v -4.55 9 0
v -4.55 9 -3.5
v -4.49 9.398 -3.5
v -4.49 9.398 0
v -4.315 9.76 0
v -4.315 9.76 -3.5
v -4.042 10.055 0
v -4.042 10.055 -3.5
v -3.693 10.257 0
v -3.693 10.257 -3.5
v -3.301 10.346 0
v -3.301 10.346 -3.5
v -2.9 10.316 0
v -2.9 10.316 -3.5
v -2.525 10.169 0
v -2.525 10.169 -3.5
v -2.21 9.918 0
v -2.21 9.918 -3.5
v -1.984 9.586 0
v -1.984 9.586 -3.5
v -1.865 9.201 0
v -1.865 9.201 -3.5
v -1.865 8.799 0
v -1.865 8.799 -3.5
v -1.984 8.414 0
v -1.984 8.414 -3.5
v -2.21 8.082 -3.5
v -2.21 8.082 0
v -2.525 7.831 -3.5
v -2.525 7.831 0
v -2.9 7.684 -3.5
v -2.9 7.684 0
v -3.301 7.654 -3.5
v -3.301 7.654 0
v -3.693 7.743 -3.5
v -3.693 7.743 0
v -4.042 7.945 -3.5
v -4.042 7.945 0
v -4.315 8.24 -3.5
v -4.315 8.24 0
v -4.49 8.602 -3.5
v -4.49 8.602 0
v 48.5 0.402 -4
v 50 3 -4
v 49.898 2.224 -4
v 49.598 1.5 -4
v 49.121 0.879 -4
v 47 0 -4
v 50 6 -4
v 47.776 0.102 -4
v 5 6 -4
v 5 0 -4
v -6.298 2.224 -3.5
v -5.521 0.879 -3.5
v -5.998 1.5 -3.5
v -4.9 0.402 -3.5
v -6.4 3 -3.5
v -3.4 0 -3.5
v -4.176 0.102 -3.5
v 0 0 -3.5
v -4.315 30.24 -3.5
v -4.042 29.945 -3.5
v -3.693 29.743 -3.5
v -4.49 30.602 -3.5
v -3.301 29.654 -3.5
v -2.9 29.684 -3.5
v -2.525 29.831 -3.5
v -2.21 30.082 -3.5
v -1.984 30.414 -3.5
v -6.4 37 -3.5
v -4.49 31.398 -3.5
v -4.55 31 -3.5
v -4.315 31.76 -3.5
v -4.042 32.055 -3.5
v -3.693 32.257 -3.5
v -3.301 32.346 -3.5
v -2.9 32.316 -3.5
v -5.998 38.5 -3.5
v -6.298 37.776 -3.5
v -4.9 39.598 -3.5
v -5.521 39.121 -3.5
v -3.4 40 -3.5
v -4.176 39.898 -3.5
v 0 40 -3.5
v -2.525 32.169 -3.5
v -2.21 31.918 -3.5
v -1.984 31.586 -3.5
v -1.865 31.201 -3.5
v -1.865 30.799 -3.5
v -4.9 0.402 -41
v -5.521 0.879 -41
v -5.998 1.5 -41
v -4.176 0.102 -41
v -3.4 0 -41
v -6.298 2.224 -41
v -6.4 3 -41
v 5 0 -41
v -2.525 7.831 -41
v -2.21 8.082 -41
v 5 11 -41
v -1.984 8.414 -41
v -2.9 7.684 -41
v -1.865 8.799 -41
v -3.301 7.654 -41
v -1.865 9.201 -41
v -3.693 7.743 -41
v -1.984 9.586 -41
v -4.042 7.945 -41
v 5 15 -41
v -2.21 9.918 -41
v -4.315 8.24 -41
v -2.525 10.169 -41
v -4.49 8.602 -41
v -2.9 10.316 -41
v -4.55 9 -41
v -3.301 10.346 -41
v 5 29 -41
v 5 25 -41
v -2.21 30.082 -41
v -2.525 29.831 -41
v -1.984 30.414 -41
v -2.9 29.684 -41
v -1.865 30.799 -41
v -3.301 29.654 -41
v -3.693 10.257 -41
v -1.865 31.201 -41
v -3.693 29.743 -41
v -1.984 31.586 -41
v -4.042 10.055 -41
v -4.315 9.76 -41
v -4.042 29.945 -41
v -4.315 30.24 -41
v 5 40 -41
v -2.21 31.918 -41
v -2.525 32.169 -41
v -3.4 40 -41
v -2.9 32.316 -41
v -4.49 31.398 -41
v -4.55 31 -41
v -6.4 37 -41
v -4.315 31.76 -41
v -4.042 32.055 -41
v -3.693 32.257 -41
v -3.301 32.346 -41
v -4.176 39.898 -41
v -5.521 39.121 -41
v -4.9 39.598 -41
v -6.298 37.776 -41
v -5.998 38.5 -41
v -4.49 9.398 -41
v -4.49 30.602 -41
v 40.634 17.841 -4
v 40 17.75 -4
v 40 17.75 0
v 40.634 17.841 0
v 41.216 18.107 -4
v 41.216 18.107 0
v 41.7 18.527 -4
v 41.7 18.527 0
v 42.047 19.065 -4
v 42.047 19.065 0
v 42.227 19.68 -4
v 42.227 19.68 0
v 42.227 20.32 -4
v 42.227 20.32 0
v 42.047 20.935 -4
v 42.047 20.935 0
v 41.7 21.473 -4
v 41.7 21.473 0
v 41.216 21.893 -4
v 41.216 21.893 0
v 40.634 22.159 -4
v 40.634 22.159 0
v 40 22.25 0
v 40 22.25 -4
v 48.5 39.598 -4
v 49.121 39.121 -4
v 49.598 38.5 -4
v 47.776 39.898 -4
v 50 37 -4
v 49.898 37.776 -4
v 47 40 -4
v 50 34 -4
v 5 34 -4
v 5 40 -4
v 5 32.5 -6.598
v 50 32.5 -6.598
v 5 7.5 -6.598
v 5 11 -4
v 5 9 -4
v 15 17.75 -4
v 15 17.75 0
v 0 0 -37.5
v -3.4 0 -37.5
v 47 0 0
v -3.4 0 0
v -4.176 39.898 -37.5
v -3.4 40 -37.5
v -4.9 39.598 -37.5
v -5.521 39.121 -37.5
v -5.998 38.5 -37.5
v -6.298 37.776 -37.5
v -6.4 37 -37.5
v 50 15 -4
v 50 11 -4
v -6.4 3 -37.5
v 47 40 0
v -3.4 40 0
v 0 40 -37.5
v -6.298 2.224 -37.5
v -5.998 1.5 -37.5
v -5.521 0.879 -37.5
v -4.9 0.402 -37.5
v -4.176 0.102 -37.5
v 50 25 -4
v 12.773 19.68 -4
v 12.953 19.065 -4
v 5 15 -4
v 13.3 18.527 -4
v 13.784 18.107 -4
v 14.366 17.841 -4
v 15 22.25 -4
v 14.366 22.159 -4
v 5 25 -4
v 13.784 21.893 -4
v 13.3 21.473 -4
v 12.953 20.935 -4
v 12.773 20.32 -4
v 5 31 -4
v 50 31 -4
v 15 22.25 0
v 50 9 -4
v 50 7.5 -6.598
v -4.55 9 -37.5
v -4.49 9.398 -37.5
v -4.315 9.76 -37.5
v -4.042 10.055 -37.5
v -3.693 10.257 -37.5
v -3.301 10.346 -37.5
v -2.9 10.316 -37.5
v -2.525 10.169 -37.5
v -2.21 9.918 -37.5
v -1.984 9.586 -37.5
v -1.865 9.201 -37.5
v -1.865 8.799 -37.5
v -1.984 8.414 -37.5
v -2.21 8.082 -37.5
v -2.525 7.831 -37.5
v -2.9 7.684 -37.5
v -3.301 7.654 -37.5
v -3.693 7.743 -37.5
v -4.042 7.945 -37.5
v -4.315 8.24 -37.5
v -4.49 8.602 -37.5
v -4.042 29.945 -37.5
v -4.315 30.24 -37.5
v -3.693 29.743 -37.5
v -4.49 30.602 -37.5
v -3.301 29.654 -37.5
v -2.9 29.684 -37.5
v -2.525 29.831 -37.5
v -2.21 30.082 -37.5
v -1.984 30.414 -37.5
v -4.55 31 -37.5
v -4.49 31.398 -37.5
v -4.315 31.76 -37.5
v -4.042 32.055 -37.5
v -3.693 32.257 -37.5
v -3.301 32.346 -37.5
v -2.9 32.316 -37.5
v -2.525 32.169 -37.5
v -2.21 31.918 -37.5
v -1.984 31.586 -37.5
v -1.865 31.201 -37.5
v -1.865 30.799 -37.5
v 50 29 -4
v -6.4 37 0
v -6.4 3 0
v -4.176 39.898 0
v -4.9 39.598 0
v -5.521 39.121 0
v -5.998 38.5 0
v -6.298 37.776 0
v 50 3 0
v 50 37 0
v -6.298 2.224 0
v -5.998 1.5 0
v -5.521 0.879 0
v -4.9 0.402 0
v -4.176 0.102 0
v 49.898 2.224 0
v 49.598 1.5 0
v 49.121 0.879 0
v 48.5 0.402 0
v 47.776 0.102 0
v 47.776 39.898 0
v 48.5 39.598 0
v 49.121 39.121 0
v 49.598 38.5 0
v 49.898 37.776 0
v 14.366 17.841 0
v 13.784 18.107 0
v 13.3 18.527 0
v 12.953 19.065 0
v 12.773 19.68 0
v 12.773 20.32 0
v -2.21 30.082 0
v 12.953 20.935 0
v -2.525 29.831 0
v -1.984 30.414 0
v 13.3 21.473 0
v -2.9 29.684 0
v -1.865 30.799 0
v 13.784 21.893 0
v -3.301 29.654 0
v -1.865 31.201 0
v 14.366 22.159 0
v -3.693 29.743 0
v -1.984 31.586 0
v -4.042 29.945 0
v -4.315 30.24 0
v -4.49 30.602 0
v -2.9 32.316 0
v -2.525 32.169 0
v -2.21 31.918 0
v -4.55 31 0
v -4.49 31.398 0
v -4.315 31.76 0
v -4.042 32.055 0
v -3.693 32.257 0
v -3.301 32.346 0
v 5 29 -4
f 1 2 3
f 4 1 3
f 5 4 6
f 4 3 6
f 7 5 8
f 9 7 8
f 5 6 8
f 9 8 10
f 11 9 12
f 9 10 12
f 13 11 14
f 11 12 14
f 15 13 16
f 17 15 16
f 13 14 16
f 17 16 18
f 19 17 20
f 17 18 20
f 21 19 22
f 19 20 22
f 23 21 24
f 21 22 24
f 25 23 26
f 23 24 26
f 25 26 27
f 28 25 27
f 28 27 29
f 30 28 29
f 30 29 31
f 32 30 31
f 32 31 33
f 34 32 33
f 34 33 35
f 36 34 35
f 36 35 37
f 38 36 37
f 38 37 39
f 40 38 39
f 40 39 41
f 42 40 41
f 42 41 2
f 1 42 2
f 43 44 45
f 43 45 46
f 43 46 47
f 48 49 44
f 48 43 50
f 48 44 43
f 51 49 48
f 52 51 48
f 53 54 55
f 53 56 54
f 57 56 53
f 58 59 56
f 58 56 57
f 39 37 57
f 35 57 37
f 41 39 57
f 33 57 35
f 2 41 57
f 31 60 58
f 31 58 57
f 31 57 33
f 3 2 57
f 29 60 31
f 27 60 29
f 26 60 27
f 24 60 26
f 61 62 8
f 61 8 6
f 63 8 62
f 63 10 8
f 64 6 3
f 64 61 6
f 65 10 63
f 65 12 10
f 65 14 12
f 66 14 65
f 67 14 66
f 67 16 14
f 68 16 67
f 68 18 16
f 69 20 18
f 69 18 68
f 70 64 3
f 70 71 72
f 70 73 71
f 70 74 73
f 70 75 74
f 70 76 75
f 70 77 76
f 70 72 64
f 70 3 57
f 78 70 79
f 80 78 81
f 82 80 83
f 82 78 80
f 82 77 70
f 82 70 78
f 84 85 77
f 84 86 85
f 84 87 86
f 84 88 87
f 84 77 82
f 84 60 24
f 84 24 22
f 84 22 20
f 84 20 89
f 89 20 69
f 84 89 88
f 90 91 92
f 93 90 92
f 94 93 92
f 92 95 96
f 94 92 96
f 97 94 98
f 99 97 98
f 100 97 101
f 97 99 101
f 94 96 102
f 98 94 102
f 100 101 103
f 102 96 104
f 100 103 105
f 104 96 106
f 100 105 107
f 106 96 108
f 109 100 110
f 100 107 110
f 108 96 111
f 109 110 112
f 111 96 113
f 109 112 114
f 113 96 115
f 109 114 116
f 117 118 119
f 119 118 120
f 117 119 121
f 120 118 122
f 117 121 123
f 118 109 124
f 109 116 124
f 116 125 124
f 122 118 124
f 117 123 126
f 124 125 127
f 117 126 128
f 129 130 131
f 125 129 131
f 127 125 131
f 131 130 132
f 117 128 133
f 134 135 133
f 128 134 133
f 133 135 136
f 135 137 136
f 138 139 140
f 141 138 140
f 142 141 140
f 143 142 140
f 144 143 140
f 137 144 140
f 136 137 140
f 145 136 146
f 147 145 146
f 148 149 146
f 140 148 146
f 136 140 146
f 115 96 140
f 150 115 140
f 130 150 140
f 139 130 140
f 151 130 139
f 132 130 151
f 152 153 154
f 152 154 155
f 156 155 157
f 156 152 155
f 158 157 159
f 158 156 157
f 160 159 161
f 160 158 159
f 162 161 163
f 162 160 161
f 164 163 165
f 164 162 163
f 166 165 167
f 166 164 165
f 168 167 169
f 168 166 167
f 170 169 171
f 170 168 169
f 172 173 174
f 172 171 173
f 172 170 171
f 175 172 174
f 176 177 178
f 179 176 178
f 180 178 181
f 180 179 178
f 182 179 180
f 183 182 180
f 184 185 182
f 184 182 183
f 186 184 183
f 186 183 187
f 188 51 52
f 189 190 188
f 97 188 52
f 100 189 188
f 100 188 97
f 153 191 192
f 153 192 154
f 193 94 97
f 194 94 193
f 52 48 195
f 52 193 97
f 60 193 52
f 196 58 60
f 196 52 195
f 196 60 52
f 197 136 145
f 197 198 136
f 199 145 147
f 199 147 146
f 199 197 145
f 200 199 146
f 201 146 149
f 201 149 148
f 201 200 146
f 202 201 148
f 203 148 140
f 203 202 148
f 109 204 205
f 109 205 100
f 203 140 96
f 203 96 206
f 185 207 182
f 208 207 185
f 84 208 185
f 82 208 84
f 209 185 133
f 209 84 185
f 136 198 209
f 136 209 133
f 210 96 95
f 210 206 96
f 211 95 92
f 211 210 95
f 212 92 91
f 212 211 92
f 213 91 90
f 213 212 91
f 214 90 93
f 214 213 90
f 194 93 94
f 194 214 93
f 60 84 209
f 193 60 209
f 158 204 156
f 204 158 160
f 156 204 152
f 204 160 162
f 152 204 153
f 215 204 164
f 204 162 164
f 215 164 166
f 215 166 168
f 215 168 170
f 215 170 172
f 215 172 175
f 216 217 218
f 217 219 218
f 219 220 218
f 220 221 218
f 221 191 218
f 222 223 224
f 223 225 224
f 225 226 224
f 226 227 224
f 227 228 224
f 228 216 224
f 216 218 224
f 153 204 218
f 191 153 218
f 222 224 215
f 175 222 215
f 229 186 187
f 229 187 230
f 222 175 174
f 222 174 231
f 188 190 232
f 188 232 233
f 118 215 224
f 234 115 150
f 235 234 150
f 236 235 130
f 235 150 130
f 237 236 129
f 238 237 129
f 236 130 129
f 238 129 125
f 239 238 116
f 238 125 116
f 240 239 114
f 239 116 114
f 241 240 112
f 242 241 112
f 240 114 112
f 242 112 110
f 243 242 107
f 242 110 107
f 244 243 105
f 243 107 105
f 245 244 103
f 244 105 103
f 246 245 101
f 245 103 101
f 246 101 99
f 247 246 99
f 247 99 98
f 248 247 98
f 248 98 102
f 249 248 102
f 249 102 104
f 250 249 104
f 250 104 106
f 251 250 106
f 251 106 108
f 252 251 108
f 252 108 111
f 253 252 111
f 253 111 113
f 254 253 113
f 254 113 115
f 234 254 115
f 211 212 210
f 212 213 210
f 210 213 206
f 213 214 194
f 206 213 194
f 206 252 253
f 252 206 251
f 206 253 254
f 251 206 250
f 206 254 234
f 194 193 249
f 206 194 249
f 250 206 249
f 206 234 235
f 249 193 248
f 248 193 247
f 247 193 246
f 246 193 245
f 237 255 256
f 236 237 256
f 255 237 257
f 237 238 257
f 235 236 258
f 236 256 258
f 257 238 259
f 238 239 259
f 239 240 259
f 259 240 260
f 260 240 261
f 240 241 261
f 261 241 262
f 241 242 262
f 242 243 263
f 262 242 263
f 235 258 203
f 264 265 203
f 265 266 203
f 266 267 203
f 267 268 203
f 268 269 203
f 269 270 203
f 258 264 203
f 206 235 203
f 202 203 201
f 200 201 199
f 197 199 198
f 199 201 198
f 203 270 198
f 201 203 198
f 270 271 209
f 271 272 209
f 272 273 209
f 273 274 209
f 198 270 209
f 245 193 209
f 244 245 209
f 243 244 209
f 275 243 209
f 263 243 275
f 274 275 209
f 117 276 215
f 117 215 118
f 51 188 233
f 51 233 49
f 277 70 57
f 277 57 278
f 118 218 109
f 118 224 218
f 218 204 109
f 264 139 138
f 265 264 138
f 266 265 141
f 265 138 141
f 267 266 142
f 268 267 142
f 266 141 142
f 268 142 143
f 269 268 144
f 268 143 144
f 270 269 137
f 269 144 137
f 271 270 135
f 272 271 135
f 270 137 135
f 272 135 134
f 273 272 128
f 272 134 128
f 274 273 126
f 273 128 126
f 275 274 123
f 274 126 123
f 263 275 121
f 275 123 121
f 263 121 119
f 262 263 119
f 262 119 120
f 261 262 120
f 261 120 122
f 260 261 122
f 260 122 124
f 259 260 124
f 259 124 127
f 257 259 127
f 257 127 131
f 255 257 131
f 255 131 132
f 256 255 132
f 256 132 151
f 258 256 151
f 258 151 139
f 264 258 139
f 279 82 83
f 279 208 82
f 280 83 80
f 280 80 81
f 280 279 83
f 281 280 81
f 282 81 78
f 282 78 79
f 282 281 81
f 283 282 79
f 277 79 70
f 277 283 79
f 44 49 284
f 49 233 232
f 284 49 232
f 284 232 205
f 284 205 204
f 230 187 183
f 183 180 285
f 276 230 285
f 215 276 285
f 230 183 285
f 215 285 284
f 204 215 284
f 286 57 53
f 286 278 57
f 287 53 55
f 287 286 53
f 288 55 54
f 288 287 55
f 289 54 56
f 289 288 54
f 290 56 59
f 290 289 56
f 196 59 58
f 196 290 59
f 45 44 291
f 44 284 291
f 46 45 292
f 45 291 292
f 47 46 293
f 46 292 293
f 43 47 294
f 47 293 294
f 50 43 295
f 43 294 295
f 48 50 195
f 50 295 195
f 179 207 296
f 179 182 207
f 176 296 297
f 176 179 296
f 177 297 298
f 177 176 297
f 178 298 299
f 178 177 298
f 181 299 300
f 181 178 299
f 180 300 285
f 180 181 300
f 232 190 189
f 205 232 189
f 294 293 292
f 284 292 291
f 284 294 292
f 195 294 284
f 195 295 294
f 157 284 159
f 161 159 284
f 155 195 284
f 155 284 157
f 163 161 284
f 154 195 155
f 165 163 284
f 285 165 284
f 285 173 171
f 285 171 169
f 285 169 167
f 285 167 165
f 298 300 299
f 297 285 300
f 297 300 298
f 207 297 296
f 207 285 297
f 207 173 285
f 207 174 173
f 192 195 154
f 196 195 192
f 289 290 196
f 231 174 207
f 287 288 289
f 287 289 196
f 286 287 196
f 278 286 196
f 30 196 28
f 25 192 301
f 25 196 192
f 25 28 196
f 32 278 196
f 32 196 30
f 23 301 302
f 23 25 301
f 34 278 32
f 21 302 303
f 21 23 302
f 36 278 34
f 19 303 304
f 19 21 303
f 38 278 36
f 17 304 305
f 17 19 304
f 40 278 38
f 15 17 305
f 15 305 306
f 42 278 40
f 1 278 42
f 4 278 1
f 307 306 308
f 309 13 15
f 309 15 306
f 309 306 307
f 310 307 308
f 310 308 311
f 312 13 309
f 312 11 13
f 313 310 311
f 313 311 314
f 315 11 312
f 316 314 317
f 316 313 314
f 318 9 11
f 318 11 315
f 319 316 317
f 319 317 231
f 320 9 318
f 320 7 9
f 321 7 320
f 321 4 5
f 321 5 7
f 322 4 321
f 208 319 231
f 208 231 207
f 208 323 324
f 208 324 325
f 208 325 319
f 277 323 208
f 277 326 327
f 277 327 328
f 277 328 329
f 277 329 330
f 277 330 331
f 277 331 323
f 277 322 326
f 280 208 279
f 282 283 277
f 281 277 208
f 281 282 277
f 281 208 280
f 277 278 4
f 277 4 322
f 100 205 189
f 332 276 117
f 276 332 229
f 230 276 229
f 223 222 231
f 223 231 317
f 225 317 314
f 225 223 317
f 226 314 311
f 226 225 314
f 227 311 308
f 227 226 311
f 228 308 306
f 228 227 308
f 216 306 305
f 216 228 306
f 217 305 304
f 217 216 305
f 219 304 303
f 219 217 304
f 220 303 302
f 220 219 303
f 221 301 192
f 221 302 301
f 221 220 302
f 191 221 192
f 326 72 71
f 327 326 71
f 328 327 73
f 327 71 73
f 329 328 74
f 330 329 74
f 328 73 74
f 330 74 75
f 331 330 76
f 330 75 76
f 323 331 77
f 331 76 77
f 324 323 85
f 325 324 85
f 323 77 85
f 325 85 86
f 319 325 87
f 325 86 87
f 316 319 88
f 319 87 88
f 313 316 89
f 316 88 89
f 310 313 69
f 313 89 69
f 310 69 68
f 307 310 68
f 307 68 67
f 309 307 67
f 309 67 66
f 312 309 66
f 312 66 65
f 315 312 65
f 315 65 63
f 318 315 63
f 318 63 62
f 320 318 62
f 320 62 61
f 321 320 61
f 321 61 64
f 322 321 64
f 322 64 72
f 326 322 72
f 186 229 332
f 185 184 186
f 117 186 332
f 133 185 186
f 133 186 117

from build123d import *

# Parameters (mm, degrees)
SKETCH_1_W               = 41
SKETCH_1_H               = 40
EXTRUDE_1_DEPTH          = 5
SKETCH_2_W               = 3.5
SKETCH_2_H               = 40
EXTRUDE_2_DEPTH          = 6.4
EXTRUDE_3_DEPTH          = 45
SKETCH_4_W               = 45
SKETCH_4_H               = 4
EXTRUDE_4_DEPTH          = 37
CUT_EXTRUDE_1_DEPTH      = 19
SKETCH_6_R               = 1.35
CUT_EXTRUDE_2_DEPTH      = 42
FILLET_1_R               = 3
FILLET_2_R               = 3
CUT_EXTRUDE_3_DEPTH      = 38
CUT_EXTRUDE_3_DEPTH_BACK = 5


with BuildPart() as part:
    # 스케치1 → 보스-돌출1 (new body)
    with BuildSketch(Plane(origin=(0, 0, 0), x_dir=(0, 0, -1), z_dir=(1, 0, 0))):
        with Locations((20.5, 20)):
            Rectangle(SKETCH_1_W, SKETCH_1_H)
    extrude(amount=EXTRUDE_1_DEPTH)

    # 스케치2 → 보스-돌출2 (add)
    with BuildSketch(Plane.ZY):
        with Locations((-1.75, 20)):
            Rectangle(SKETCH_2_W, SKETCH_2_H)
        with Locations((-39.25, 20)):
            Rectangle(SKETCH_2_W, SKETCH_2_H)
    extrude(amount=EXTRUDE_2_DEPTH)

    # 스케치3 → 보스-돌출3 (add)
    with BuildSketch(Plane(origin=(5, 0, 0), x_dir=(0, 0, -1), z_dir=(1, 0, 0))):
        Polygon((0, 40), (4, 40), (4, 34), (6.598076211, 32.5), (4, 31), (4, 14), (4, 12), (4, 9), (6.598076211, 7.5), (4, 6), (4, 0), (0, 0), align=None)
    extrude(amount=EXTRUDE_3_DEPTH)

    # 스케치4 → 보스-돌출4 (add)
    with BuildSketch(Plane(origin=(0, 0, -4), x_dir=(-1, 0, 0), z_dir=(0, 0, -1))):
        with Locations((-27.5, 27)):
            Rectangle(SKETCH_4_W, SKETCH_4_H)
        with Locations((-27.5, 13)):
            Rectangle(SKETCH_4_W, SKETCH_4_H)
    extrude(amount=EXTRUDE_4_DEPTH)

    # 스케치5 → 컷-돌출1 (cut)
    with BuildSketch(Plane(origin=(0, 29, 0), x_dir=(1, 0, 0), z_dir=(0, 1, 0))):
        Polygon((50, 4), (5, 41), (50, 41), align=None)
    extrude(amount=-CUT_EXTRUDE_1_DEPTH, mode=Mode.SUBTRACT)

    # 스케치6 → 컷-돌출2 (cut, through all)
    with BuildSketch(Plane(origin=(0, 0, -41), x_dir=(-1, 0, 0), z_dir=(0, 0, -1))):
        with Locations((3.2, 9)):
            Circle(SKETCH_6_R)
        with Locations((3.2, 31)):
            Circle(SKETCH_6_R)
    extrude(amount=-CUT_EXTRUDE_2_DEPTH, mode=Mode.SUBTRACT)

    # 필렛1
    fillet_1_edges = [part.edges().sort_by_distance(p)[0] for p in [
        (50, 0, -2),
        (50, 40, -2),
    ]]
    fillet(fillet_1_edges, radius=FILLET_1_R)

    # 필렛2
    fillet_2_edges = [part.edges().sort_by_distance(p)[0] for p in [
        (-6.4, 0, -1.75),
        (-6.4, 40, -1.75),
        (-6.4, 40, -39.25),
        (-6.4, 0, -39.25),
    ]]
    fillet(fillet_2_edges, radius=FILLET_2_R)

    # 스케치7 → 컷-돌출3 (cut, two sides)
    with BuildSketch(Plane(origin=(0, 0, -4), x_dir=(-1, 0, 0), z_dir=(0, 0, -1))) as cut_extrude_3_sk:
        with BuildLine():
            Line((-40, 22.25), (-15, 22.25))
            ThreePointArc((-15, 22.25), (-12.75, 20), (-15, 17.75))
            Line((-15, 17.75), (-40, 17.75))
            ThreePointArc((-40, 17.75), (-42.25, 20), (-40, 22.25))
        make_face()
    extrude(amount=CUT_EXTRUDE_3_DEPTH, mode=Mode.SUBTRACT)
    extrude(cut_extrude_3_sk.sketch, amount=-CUT_EXTRUDE_3_DEPTH_BACK, mode=Mode.SUBTRACT)


solid = part.part
